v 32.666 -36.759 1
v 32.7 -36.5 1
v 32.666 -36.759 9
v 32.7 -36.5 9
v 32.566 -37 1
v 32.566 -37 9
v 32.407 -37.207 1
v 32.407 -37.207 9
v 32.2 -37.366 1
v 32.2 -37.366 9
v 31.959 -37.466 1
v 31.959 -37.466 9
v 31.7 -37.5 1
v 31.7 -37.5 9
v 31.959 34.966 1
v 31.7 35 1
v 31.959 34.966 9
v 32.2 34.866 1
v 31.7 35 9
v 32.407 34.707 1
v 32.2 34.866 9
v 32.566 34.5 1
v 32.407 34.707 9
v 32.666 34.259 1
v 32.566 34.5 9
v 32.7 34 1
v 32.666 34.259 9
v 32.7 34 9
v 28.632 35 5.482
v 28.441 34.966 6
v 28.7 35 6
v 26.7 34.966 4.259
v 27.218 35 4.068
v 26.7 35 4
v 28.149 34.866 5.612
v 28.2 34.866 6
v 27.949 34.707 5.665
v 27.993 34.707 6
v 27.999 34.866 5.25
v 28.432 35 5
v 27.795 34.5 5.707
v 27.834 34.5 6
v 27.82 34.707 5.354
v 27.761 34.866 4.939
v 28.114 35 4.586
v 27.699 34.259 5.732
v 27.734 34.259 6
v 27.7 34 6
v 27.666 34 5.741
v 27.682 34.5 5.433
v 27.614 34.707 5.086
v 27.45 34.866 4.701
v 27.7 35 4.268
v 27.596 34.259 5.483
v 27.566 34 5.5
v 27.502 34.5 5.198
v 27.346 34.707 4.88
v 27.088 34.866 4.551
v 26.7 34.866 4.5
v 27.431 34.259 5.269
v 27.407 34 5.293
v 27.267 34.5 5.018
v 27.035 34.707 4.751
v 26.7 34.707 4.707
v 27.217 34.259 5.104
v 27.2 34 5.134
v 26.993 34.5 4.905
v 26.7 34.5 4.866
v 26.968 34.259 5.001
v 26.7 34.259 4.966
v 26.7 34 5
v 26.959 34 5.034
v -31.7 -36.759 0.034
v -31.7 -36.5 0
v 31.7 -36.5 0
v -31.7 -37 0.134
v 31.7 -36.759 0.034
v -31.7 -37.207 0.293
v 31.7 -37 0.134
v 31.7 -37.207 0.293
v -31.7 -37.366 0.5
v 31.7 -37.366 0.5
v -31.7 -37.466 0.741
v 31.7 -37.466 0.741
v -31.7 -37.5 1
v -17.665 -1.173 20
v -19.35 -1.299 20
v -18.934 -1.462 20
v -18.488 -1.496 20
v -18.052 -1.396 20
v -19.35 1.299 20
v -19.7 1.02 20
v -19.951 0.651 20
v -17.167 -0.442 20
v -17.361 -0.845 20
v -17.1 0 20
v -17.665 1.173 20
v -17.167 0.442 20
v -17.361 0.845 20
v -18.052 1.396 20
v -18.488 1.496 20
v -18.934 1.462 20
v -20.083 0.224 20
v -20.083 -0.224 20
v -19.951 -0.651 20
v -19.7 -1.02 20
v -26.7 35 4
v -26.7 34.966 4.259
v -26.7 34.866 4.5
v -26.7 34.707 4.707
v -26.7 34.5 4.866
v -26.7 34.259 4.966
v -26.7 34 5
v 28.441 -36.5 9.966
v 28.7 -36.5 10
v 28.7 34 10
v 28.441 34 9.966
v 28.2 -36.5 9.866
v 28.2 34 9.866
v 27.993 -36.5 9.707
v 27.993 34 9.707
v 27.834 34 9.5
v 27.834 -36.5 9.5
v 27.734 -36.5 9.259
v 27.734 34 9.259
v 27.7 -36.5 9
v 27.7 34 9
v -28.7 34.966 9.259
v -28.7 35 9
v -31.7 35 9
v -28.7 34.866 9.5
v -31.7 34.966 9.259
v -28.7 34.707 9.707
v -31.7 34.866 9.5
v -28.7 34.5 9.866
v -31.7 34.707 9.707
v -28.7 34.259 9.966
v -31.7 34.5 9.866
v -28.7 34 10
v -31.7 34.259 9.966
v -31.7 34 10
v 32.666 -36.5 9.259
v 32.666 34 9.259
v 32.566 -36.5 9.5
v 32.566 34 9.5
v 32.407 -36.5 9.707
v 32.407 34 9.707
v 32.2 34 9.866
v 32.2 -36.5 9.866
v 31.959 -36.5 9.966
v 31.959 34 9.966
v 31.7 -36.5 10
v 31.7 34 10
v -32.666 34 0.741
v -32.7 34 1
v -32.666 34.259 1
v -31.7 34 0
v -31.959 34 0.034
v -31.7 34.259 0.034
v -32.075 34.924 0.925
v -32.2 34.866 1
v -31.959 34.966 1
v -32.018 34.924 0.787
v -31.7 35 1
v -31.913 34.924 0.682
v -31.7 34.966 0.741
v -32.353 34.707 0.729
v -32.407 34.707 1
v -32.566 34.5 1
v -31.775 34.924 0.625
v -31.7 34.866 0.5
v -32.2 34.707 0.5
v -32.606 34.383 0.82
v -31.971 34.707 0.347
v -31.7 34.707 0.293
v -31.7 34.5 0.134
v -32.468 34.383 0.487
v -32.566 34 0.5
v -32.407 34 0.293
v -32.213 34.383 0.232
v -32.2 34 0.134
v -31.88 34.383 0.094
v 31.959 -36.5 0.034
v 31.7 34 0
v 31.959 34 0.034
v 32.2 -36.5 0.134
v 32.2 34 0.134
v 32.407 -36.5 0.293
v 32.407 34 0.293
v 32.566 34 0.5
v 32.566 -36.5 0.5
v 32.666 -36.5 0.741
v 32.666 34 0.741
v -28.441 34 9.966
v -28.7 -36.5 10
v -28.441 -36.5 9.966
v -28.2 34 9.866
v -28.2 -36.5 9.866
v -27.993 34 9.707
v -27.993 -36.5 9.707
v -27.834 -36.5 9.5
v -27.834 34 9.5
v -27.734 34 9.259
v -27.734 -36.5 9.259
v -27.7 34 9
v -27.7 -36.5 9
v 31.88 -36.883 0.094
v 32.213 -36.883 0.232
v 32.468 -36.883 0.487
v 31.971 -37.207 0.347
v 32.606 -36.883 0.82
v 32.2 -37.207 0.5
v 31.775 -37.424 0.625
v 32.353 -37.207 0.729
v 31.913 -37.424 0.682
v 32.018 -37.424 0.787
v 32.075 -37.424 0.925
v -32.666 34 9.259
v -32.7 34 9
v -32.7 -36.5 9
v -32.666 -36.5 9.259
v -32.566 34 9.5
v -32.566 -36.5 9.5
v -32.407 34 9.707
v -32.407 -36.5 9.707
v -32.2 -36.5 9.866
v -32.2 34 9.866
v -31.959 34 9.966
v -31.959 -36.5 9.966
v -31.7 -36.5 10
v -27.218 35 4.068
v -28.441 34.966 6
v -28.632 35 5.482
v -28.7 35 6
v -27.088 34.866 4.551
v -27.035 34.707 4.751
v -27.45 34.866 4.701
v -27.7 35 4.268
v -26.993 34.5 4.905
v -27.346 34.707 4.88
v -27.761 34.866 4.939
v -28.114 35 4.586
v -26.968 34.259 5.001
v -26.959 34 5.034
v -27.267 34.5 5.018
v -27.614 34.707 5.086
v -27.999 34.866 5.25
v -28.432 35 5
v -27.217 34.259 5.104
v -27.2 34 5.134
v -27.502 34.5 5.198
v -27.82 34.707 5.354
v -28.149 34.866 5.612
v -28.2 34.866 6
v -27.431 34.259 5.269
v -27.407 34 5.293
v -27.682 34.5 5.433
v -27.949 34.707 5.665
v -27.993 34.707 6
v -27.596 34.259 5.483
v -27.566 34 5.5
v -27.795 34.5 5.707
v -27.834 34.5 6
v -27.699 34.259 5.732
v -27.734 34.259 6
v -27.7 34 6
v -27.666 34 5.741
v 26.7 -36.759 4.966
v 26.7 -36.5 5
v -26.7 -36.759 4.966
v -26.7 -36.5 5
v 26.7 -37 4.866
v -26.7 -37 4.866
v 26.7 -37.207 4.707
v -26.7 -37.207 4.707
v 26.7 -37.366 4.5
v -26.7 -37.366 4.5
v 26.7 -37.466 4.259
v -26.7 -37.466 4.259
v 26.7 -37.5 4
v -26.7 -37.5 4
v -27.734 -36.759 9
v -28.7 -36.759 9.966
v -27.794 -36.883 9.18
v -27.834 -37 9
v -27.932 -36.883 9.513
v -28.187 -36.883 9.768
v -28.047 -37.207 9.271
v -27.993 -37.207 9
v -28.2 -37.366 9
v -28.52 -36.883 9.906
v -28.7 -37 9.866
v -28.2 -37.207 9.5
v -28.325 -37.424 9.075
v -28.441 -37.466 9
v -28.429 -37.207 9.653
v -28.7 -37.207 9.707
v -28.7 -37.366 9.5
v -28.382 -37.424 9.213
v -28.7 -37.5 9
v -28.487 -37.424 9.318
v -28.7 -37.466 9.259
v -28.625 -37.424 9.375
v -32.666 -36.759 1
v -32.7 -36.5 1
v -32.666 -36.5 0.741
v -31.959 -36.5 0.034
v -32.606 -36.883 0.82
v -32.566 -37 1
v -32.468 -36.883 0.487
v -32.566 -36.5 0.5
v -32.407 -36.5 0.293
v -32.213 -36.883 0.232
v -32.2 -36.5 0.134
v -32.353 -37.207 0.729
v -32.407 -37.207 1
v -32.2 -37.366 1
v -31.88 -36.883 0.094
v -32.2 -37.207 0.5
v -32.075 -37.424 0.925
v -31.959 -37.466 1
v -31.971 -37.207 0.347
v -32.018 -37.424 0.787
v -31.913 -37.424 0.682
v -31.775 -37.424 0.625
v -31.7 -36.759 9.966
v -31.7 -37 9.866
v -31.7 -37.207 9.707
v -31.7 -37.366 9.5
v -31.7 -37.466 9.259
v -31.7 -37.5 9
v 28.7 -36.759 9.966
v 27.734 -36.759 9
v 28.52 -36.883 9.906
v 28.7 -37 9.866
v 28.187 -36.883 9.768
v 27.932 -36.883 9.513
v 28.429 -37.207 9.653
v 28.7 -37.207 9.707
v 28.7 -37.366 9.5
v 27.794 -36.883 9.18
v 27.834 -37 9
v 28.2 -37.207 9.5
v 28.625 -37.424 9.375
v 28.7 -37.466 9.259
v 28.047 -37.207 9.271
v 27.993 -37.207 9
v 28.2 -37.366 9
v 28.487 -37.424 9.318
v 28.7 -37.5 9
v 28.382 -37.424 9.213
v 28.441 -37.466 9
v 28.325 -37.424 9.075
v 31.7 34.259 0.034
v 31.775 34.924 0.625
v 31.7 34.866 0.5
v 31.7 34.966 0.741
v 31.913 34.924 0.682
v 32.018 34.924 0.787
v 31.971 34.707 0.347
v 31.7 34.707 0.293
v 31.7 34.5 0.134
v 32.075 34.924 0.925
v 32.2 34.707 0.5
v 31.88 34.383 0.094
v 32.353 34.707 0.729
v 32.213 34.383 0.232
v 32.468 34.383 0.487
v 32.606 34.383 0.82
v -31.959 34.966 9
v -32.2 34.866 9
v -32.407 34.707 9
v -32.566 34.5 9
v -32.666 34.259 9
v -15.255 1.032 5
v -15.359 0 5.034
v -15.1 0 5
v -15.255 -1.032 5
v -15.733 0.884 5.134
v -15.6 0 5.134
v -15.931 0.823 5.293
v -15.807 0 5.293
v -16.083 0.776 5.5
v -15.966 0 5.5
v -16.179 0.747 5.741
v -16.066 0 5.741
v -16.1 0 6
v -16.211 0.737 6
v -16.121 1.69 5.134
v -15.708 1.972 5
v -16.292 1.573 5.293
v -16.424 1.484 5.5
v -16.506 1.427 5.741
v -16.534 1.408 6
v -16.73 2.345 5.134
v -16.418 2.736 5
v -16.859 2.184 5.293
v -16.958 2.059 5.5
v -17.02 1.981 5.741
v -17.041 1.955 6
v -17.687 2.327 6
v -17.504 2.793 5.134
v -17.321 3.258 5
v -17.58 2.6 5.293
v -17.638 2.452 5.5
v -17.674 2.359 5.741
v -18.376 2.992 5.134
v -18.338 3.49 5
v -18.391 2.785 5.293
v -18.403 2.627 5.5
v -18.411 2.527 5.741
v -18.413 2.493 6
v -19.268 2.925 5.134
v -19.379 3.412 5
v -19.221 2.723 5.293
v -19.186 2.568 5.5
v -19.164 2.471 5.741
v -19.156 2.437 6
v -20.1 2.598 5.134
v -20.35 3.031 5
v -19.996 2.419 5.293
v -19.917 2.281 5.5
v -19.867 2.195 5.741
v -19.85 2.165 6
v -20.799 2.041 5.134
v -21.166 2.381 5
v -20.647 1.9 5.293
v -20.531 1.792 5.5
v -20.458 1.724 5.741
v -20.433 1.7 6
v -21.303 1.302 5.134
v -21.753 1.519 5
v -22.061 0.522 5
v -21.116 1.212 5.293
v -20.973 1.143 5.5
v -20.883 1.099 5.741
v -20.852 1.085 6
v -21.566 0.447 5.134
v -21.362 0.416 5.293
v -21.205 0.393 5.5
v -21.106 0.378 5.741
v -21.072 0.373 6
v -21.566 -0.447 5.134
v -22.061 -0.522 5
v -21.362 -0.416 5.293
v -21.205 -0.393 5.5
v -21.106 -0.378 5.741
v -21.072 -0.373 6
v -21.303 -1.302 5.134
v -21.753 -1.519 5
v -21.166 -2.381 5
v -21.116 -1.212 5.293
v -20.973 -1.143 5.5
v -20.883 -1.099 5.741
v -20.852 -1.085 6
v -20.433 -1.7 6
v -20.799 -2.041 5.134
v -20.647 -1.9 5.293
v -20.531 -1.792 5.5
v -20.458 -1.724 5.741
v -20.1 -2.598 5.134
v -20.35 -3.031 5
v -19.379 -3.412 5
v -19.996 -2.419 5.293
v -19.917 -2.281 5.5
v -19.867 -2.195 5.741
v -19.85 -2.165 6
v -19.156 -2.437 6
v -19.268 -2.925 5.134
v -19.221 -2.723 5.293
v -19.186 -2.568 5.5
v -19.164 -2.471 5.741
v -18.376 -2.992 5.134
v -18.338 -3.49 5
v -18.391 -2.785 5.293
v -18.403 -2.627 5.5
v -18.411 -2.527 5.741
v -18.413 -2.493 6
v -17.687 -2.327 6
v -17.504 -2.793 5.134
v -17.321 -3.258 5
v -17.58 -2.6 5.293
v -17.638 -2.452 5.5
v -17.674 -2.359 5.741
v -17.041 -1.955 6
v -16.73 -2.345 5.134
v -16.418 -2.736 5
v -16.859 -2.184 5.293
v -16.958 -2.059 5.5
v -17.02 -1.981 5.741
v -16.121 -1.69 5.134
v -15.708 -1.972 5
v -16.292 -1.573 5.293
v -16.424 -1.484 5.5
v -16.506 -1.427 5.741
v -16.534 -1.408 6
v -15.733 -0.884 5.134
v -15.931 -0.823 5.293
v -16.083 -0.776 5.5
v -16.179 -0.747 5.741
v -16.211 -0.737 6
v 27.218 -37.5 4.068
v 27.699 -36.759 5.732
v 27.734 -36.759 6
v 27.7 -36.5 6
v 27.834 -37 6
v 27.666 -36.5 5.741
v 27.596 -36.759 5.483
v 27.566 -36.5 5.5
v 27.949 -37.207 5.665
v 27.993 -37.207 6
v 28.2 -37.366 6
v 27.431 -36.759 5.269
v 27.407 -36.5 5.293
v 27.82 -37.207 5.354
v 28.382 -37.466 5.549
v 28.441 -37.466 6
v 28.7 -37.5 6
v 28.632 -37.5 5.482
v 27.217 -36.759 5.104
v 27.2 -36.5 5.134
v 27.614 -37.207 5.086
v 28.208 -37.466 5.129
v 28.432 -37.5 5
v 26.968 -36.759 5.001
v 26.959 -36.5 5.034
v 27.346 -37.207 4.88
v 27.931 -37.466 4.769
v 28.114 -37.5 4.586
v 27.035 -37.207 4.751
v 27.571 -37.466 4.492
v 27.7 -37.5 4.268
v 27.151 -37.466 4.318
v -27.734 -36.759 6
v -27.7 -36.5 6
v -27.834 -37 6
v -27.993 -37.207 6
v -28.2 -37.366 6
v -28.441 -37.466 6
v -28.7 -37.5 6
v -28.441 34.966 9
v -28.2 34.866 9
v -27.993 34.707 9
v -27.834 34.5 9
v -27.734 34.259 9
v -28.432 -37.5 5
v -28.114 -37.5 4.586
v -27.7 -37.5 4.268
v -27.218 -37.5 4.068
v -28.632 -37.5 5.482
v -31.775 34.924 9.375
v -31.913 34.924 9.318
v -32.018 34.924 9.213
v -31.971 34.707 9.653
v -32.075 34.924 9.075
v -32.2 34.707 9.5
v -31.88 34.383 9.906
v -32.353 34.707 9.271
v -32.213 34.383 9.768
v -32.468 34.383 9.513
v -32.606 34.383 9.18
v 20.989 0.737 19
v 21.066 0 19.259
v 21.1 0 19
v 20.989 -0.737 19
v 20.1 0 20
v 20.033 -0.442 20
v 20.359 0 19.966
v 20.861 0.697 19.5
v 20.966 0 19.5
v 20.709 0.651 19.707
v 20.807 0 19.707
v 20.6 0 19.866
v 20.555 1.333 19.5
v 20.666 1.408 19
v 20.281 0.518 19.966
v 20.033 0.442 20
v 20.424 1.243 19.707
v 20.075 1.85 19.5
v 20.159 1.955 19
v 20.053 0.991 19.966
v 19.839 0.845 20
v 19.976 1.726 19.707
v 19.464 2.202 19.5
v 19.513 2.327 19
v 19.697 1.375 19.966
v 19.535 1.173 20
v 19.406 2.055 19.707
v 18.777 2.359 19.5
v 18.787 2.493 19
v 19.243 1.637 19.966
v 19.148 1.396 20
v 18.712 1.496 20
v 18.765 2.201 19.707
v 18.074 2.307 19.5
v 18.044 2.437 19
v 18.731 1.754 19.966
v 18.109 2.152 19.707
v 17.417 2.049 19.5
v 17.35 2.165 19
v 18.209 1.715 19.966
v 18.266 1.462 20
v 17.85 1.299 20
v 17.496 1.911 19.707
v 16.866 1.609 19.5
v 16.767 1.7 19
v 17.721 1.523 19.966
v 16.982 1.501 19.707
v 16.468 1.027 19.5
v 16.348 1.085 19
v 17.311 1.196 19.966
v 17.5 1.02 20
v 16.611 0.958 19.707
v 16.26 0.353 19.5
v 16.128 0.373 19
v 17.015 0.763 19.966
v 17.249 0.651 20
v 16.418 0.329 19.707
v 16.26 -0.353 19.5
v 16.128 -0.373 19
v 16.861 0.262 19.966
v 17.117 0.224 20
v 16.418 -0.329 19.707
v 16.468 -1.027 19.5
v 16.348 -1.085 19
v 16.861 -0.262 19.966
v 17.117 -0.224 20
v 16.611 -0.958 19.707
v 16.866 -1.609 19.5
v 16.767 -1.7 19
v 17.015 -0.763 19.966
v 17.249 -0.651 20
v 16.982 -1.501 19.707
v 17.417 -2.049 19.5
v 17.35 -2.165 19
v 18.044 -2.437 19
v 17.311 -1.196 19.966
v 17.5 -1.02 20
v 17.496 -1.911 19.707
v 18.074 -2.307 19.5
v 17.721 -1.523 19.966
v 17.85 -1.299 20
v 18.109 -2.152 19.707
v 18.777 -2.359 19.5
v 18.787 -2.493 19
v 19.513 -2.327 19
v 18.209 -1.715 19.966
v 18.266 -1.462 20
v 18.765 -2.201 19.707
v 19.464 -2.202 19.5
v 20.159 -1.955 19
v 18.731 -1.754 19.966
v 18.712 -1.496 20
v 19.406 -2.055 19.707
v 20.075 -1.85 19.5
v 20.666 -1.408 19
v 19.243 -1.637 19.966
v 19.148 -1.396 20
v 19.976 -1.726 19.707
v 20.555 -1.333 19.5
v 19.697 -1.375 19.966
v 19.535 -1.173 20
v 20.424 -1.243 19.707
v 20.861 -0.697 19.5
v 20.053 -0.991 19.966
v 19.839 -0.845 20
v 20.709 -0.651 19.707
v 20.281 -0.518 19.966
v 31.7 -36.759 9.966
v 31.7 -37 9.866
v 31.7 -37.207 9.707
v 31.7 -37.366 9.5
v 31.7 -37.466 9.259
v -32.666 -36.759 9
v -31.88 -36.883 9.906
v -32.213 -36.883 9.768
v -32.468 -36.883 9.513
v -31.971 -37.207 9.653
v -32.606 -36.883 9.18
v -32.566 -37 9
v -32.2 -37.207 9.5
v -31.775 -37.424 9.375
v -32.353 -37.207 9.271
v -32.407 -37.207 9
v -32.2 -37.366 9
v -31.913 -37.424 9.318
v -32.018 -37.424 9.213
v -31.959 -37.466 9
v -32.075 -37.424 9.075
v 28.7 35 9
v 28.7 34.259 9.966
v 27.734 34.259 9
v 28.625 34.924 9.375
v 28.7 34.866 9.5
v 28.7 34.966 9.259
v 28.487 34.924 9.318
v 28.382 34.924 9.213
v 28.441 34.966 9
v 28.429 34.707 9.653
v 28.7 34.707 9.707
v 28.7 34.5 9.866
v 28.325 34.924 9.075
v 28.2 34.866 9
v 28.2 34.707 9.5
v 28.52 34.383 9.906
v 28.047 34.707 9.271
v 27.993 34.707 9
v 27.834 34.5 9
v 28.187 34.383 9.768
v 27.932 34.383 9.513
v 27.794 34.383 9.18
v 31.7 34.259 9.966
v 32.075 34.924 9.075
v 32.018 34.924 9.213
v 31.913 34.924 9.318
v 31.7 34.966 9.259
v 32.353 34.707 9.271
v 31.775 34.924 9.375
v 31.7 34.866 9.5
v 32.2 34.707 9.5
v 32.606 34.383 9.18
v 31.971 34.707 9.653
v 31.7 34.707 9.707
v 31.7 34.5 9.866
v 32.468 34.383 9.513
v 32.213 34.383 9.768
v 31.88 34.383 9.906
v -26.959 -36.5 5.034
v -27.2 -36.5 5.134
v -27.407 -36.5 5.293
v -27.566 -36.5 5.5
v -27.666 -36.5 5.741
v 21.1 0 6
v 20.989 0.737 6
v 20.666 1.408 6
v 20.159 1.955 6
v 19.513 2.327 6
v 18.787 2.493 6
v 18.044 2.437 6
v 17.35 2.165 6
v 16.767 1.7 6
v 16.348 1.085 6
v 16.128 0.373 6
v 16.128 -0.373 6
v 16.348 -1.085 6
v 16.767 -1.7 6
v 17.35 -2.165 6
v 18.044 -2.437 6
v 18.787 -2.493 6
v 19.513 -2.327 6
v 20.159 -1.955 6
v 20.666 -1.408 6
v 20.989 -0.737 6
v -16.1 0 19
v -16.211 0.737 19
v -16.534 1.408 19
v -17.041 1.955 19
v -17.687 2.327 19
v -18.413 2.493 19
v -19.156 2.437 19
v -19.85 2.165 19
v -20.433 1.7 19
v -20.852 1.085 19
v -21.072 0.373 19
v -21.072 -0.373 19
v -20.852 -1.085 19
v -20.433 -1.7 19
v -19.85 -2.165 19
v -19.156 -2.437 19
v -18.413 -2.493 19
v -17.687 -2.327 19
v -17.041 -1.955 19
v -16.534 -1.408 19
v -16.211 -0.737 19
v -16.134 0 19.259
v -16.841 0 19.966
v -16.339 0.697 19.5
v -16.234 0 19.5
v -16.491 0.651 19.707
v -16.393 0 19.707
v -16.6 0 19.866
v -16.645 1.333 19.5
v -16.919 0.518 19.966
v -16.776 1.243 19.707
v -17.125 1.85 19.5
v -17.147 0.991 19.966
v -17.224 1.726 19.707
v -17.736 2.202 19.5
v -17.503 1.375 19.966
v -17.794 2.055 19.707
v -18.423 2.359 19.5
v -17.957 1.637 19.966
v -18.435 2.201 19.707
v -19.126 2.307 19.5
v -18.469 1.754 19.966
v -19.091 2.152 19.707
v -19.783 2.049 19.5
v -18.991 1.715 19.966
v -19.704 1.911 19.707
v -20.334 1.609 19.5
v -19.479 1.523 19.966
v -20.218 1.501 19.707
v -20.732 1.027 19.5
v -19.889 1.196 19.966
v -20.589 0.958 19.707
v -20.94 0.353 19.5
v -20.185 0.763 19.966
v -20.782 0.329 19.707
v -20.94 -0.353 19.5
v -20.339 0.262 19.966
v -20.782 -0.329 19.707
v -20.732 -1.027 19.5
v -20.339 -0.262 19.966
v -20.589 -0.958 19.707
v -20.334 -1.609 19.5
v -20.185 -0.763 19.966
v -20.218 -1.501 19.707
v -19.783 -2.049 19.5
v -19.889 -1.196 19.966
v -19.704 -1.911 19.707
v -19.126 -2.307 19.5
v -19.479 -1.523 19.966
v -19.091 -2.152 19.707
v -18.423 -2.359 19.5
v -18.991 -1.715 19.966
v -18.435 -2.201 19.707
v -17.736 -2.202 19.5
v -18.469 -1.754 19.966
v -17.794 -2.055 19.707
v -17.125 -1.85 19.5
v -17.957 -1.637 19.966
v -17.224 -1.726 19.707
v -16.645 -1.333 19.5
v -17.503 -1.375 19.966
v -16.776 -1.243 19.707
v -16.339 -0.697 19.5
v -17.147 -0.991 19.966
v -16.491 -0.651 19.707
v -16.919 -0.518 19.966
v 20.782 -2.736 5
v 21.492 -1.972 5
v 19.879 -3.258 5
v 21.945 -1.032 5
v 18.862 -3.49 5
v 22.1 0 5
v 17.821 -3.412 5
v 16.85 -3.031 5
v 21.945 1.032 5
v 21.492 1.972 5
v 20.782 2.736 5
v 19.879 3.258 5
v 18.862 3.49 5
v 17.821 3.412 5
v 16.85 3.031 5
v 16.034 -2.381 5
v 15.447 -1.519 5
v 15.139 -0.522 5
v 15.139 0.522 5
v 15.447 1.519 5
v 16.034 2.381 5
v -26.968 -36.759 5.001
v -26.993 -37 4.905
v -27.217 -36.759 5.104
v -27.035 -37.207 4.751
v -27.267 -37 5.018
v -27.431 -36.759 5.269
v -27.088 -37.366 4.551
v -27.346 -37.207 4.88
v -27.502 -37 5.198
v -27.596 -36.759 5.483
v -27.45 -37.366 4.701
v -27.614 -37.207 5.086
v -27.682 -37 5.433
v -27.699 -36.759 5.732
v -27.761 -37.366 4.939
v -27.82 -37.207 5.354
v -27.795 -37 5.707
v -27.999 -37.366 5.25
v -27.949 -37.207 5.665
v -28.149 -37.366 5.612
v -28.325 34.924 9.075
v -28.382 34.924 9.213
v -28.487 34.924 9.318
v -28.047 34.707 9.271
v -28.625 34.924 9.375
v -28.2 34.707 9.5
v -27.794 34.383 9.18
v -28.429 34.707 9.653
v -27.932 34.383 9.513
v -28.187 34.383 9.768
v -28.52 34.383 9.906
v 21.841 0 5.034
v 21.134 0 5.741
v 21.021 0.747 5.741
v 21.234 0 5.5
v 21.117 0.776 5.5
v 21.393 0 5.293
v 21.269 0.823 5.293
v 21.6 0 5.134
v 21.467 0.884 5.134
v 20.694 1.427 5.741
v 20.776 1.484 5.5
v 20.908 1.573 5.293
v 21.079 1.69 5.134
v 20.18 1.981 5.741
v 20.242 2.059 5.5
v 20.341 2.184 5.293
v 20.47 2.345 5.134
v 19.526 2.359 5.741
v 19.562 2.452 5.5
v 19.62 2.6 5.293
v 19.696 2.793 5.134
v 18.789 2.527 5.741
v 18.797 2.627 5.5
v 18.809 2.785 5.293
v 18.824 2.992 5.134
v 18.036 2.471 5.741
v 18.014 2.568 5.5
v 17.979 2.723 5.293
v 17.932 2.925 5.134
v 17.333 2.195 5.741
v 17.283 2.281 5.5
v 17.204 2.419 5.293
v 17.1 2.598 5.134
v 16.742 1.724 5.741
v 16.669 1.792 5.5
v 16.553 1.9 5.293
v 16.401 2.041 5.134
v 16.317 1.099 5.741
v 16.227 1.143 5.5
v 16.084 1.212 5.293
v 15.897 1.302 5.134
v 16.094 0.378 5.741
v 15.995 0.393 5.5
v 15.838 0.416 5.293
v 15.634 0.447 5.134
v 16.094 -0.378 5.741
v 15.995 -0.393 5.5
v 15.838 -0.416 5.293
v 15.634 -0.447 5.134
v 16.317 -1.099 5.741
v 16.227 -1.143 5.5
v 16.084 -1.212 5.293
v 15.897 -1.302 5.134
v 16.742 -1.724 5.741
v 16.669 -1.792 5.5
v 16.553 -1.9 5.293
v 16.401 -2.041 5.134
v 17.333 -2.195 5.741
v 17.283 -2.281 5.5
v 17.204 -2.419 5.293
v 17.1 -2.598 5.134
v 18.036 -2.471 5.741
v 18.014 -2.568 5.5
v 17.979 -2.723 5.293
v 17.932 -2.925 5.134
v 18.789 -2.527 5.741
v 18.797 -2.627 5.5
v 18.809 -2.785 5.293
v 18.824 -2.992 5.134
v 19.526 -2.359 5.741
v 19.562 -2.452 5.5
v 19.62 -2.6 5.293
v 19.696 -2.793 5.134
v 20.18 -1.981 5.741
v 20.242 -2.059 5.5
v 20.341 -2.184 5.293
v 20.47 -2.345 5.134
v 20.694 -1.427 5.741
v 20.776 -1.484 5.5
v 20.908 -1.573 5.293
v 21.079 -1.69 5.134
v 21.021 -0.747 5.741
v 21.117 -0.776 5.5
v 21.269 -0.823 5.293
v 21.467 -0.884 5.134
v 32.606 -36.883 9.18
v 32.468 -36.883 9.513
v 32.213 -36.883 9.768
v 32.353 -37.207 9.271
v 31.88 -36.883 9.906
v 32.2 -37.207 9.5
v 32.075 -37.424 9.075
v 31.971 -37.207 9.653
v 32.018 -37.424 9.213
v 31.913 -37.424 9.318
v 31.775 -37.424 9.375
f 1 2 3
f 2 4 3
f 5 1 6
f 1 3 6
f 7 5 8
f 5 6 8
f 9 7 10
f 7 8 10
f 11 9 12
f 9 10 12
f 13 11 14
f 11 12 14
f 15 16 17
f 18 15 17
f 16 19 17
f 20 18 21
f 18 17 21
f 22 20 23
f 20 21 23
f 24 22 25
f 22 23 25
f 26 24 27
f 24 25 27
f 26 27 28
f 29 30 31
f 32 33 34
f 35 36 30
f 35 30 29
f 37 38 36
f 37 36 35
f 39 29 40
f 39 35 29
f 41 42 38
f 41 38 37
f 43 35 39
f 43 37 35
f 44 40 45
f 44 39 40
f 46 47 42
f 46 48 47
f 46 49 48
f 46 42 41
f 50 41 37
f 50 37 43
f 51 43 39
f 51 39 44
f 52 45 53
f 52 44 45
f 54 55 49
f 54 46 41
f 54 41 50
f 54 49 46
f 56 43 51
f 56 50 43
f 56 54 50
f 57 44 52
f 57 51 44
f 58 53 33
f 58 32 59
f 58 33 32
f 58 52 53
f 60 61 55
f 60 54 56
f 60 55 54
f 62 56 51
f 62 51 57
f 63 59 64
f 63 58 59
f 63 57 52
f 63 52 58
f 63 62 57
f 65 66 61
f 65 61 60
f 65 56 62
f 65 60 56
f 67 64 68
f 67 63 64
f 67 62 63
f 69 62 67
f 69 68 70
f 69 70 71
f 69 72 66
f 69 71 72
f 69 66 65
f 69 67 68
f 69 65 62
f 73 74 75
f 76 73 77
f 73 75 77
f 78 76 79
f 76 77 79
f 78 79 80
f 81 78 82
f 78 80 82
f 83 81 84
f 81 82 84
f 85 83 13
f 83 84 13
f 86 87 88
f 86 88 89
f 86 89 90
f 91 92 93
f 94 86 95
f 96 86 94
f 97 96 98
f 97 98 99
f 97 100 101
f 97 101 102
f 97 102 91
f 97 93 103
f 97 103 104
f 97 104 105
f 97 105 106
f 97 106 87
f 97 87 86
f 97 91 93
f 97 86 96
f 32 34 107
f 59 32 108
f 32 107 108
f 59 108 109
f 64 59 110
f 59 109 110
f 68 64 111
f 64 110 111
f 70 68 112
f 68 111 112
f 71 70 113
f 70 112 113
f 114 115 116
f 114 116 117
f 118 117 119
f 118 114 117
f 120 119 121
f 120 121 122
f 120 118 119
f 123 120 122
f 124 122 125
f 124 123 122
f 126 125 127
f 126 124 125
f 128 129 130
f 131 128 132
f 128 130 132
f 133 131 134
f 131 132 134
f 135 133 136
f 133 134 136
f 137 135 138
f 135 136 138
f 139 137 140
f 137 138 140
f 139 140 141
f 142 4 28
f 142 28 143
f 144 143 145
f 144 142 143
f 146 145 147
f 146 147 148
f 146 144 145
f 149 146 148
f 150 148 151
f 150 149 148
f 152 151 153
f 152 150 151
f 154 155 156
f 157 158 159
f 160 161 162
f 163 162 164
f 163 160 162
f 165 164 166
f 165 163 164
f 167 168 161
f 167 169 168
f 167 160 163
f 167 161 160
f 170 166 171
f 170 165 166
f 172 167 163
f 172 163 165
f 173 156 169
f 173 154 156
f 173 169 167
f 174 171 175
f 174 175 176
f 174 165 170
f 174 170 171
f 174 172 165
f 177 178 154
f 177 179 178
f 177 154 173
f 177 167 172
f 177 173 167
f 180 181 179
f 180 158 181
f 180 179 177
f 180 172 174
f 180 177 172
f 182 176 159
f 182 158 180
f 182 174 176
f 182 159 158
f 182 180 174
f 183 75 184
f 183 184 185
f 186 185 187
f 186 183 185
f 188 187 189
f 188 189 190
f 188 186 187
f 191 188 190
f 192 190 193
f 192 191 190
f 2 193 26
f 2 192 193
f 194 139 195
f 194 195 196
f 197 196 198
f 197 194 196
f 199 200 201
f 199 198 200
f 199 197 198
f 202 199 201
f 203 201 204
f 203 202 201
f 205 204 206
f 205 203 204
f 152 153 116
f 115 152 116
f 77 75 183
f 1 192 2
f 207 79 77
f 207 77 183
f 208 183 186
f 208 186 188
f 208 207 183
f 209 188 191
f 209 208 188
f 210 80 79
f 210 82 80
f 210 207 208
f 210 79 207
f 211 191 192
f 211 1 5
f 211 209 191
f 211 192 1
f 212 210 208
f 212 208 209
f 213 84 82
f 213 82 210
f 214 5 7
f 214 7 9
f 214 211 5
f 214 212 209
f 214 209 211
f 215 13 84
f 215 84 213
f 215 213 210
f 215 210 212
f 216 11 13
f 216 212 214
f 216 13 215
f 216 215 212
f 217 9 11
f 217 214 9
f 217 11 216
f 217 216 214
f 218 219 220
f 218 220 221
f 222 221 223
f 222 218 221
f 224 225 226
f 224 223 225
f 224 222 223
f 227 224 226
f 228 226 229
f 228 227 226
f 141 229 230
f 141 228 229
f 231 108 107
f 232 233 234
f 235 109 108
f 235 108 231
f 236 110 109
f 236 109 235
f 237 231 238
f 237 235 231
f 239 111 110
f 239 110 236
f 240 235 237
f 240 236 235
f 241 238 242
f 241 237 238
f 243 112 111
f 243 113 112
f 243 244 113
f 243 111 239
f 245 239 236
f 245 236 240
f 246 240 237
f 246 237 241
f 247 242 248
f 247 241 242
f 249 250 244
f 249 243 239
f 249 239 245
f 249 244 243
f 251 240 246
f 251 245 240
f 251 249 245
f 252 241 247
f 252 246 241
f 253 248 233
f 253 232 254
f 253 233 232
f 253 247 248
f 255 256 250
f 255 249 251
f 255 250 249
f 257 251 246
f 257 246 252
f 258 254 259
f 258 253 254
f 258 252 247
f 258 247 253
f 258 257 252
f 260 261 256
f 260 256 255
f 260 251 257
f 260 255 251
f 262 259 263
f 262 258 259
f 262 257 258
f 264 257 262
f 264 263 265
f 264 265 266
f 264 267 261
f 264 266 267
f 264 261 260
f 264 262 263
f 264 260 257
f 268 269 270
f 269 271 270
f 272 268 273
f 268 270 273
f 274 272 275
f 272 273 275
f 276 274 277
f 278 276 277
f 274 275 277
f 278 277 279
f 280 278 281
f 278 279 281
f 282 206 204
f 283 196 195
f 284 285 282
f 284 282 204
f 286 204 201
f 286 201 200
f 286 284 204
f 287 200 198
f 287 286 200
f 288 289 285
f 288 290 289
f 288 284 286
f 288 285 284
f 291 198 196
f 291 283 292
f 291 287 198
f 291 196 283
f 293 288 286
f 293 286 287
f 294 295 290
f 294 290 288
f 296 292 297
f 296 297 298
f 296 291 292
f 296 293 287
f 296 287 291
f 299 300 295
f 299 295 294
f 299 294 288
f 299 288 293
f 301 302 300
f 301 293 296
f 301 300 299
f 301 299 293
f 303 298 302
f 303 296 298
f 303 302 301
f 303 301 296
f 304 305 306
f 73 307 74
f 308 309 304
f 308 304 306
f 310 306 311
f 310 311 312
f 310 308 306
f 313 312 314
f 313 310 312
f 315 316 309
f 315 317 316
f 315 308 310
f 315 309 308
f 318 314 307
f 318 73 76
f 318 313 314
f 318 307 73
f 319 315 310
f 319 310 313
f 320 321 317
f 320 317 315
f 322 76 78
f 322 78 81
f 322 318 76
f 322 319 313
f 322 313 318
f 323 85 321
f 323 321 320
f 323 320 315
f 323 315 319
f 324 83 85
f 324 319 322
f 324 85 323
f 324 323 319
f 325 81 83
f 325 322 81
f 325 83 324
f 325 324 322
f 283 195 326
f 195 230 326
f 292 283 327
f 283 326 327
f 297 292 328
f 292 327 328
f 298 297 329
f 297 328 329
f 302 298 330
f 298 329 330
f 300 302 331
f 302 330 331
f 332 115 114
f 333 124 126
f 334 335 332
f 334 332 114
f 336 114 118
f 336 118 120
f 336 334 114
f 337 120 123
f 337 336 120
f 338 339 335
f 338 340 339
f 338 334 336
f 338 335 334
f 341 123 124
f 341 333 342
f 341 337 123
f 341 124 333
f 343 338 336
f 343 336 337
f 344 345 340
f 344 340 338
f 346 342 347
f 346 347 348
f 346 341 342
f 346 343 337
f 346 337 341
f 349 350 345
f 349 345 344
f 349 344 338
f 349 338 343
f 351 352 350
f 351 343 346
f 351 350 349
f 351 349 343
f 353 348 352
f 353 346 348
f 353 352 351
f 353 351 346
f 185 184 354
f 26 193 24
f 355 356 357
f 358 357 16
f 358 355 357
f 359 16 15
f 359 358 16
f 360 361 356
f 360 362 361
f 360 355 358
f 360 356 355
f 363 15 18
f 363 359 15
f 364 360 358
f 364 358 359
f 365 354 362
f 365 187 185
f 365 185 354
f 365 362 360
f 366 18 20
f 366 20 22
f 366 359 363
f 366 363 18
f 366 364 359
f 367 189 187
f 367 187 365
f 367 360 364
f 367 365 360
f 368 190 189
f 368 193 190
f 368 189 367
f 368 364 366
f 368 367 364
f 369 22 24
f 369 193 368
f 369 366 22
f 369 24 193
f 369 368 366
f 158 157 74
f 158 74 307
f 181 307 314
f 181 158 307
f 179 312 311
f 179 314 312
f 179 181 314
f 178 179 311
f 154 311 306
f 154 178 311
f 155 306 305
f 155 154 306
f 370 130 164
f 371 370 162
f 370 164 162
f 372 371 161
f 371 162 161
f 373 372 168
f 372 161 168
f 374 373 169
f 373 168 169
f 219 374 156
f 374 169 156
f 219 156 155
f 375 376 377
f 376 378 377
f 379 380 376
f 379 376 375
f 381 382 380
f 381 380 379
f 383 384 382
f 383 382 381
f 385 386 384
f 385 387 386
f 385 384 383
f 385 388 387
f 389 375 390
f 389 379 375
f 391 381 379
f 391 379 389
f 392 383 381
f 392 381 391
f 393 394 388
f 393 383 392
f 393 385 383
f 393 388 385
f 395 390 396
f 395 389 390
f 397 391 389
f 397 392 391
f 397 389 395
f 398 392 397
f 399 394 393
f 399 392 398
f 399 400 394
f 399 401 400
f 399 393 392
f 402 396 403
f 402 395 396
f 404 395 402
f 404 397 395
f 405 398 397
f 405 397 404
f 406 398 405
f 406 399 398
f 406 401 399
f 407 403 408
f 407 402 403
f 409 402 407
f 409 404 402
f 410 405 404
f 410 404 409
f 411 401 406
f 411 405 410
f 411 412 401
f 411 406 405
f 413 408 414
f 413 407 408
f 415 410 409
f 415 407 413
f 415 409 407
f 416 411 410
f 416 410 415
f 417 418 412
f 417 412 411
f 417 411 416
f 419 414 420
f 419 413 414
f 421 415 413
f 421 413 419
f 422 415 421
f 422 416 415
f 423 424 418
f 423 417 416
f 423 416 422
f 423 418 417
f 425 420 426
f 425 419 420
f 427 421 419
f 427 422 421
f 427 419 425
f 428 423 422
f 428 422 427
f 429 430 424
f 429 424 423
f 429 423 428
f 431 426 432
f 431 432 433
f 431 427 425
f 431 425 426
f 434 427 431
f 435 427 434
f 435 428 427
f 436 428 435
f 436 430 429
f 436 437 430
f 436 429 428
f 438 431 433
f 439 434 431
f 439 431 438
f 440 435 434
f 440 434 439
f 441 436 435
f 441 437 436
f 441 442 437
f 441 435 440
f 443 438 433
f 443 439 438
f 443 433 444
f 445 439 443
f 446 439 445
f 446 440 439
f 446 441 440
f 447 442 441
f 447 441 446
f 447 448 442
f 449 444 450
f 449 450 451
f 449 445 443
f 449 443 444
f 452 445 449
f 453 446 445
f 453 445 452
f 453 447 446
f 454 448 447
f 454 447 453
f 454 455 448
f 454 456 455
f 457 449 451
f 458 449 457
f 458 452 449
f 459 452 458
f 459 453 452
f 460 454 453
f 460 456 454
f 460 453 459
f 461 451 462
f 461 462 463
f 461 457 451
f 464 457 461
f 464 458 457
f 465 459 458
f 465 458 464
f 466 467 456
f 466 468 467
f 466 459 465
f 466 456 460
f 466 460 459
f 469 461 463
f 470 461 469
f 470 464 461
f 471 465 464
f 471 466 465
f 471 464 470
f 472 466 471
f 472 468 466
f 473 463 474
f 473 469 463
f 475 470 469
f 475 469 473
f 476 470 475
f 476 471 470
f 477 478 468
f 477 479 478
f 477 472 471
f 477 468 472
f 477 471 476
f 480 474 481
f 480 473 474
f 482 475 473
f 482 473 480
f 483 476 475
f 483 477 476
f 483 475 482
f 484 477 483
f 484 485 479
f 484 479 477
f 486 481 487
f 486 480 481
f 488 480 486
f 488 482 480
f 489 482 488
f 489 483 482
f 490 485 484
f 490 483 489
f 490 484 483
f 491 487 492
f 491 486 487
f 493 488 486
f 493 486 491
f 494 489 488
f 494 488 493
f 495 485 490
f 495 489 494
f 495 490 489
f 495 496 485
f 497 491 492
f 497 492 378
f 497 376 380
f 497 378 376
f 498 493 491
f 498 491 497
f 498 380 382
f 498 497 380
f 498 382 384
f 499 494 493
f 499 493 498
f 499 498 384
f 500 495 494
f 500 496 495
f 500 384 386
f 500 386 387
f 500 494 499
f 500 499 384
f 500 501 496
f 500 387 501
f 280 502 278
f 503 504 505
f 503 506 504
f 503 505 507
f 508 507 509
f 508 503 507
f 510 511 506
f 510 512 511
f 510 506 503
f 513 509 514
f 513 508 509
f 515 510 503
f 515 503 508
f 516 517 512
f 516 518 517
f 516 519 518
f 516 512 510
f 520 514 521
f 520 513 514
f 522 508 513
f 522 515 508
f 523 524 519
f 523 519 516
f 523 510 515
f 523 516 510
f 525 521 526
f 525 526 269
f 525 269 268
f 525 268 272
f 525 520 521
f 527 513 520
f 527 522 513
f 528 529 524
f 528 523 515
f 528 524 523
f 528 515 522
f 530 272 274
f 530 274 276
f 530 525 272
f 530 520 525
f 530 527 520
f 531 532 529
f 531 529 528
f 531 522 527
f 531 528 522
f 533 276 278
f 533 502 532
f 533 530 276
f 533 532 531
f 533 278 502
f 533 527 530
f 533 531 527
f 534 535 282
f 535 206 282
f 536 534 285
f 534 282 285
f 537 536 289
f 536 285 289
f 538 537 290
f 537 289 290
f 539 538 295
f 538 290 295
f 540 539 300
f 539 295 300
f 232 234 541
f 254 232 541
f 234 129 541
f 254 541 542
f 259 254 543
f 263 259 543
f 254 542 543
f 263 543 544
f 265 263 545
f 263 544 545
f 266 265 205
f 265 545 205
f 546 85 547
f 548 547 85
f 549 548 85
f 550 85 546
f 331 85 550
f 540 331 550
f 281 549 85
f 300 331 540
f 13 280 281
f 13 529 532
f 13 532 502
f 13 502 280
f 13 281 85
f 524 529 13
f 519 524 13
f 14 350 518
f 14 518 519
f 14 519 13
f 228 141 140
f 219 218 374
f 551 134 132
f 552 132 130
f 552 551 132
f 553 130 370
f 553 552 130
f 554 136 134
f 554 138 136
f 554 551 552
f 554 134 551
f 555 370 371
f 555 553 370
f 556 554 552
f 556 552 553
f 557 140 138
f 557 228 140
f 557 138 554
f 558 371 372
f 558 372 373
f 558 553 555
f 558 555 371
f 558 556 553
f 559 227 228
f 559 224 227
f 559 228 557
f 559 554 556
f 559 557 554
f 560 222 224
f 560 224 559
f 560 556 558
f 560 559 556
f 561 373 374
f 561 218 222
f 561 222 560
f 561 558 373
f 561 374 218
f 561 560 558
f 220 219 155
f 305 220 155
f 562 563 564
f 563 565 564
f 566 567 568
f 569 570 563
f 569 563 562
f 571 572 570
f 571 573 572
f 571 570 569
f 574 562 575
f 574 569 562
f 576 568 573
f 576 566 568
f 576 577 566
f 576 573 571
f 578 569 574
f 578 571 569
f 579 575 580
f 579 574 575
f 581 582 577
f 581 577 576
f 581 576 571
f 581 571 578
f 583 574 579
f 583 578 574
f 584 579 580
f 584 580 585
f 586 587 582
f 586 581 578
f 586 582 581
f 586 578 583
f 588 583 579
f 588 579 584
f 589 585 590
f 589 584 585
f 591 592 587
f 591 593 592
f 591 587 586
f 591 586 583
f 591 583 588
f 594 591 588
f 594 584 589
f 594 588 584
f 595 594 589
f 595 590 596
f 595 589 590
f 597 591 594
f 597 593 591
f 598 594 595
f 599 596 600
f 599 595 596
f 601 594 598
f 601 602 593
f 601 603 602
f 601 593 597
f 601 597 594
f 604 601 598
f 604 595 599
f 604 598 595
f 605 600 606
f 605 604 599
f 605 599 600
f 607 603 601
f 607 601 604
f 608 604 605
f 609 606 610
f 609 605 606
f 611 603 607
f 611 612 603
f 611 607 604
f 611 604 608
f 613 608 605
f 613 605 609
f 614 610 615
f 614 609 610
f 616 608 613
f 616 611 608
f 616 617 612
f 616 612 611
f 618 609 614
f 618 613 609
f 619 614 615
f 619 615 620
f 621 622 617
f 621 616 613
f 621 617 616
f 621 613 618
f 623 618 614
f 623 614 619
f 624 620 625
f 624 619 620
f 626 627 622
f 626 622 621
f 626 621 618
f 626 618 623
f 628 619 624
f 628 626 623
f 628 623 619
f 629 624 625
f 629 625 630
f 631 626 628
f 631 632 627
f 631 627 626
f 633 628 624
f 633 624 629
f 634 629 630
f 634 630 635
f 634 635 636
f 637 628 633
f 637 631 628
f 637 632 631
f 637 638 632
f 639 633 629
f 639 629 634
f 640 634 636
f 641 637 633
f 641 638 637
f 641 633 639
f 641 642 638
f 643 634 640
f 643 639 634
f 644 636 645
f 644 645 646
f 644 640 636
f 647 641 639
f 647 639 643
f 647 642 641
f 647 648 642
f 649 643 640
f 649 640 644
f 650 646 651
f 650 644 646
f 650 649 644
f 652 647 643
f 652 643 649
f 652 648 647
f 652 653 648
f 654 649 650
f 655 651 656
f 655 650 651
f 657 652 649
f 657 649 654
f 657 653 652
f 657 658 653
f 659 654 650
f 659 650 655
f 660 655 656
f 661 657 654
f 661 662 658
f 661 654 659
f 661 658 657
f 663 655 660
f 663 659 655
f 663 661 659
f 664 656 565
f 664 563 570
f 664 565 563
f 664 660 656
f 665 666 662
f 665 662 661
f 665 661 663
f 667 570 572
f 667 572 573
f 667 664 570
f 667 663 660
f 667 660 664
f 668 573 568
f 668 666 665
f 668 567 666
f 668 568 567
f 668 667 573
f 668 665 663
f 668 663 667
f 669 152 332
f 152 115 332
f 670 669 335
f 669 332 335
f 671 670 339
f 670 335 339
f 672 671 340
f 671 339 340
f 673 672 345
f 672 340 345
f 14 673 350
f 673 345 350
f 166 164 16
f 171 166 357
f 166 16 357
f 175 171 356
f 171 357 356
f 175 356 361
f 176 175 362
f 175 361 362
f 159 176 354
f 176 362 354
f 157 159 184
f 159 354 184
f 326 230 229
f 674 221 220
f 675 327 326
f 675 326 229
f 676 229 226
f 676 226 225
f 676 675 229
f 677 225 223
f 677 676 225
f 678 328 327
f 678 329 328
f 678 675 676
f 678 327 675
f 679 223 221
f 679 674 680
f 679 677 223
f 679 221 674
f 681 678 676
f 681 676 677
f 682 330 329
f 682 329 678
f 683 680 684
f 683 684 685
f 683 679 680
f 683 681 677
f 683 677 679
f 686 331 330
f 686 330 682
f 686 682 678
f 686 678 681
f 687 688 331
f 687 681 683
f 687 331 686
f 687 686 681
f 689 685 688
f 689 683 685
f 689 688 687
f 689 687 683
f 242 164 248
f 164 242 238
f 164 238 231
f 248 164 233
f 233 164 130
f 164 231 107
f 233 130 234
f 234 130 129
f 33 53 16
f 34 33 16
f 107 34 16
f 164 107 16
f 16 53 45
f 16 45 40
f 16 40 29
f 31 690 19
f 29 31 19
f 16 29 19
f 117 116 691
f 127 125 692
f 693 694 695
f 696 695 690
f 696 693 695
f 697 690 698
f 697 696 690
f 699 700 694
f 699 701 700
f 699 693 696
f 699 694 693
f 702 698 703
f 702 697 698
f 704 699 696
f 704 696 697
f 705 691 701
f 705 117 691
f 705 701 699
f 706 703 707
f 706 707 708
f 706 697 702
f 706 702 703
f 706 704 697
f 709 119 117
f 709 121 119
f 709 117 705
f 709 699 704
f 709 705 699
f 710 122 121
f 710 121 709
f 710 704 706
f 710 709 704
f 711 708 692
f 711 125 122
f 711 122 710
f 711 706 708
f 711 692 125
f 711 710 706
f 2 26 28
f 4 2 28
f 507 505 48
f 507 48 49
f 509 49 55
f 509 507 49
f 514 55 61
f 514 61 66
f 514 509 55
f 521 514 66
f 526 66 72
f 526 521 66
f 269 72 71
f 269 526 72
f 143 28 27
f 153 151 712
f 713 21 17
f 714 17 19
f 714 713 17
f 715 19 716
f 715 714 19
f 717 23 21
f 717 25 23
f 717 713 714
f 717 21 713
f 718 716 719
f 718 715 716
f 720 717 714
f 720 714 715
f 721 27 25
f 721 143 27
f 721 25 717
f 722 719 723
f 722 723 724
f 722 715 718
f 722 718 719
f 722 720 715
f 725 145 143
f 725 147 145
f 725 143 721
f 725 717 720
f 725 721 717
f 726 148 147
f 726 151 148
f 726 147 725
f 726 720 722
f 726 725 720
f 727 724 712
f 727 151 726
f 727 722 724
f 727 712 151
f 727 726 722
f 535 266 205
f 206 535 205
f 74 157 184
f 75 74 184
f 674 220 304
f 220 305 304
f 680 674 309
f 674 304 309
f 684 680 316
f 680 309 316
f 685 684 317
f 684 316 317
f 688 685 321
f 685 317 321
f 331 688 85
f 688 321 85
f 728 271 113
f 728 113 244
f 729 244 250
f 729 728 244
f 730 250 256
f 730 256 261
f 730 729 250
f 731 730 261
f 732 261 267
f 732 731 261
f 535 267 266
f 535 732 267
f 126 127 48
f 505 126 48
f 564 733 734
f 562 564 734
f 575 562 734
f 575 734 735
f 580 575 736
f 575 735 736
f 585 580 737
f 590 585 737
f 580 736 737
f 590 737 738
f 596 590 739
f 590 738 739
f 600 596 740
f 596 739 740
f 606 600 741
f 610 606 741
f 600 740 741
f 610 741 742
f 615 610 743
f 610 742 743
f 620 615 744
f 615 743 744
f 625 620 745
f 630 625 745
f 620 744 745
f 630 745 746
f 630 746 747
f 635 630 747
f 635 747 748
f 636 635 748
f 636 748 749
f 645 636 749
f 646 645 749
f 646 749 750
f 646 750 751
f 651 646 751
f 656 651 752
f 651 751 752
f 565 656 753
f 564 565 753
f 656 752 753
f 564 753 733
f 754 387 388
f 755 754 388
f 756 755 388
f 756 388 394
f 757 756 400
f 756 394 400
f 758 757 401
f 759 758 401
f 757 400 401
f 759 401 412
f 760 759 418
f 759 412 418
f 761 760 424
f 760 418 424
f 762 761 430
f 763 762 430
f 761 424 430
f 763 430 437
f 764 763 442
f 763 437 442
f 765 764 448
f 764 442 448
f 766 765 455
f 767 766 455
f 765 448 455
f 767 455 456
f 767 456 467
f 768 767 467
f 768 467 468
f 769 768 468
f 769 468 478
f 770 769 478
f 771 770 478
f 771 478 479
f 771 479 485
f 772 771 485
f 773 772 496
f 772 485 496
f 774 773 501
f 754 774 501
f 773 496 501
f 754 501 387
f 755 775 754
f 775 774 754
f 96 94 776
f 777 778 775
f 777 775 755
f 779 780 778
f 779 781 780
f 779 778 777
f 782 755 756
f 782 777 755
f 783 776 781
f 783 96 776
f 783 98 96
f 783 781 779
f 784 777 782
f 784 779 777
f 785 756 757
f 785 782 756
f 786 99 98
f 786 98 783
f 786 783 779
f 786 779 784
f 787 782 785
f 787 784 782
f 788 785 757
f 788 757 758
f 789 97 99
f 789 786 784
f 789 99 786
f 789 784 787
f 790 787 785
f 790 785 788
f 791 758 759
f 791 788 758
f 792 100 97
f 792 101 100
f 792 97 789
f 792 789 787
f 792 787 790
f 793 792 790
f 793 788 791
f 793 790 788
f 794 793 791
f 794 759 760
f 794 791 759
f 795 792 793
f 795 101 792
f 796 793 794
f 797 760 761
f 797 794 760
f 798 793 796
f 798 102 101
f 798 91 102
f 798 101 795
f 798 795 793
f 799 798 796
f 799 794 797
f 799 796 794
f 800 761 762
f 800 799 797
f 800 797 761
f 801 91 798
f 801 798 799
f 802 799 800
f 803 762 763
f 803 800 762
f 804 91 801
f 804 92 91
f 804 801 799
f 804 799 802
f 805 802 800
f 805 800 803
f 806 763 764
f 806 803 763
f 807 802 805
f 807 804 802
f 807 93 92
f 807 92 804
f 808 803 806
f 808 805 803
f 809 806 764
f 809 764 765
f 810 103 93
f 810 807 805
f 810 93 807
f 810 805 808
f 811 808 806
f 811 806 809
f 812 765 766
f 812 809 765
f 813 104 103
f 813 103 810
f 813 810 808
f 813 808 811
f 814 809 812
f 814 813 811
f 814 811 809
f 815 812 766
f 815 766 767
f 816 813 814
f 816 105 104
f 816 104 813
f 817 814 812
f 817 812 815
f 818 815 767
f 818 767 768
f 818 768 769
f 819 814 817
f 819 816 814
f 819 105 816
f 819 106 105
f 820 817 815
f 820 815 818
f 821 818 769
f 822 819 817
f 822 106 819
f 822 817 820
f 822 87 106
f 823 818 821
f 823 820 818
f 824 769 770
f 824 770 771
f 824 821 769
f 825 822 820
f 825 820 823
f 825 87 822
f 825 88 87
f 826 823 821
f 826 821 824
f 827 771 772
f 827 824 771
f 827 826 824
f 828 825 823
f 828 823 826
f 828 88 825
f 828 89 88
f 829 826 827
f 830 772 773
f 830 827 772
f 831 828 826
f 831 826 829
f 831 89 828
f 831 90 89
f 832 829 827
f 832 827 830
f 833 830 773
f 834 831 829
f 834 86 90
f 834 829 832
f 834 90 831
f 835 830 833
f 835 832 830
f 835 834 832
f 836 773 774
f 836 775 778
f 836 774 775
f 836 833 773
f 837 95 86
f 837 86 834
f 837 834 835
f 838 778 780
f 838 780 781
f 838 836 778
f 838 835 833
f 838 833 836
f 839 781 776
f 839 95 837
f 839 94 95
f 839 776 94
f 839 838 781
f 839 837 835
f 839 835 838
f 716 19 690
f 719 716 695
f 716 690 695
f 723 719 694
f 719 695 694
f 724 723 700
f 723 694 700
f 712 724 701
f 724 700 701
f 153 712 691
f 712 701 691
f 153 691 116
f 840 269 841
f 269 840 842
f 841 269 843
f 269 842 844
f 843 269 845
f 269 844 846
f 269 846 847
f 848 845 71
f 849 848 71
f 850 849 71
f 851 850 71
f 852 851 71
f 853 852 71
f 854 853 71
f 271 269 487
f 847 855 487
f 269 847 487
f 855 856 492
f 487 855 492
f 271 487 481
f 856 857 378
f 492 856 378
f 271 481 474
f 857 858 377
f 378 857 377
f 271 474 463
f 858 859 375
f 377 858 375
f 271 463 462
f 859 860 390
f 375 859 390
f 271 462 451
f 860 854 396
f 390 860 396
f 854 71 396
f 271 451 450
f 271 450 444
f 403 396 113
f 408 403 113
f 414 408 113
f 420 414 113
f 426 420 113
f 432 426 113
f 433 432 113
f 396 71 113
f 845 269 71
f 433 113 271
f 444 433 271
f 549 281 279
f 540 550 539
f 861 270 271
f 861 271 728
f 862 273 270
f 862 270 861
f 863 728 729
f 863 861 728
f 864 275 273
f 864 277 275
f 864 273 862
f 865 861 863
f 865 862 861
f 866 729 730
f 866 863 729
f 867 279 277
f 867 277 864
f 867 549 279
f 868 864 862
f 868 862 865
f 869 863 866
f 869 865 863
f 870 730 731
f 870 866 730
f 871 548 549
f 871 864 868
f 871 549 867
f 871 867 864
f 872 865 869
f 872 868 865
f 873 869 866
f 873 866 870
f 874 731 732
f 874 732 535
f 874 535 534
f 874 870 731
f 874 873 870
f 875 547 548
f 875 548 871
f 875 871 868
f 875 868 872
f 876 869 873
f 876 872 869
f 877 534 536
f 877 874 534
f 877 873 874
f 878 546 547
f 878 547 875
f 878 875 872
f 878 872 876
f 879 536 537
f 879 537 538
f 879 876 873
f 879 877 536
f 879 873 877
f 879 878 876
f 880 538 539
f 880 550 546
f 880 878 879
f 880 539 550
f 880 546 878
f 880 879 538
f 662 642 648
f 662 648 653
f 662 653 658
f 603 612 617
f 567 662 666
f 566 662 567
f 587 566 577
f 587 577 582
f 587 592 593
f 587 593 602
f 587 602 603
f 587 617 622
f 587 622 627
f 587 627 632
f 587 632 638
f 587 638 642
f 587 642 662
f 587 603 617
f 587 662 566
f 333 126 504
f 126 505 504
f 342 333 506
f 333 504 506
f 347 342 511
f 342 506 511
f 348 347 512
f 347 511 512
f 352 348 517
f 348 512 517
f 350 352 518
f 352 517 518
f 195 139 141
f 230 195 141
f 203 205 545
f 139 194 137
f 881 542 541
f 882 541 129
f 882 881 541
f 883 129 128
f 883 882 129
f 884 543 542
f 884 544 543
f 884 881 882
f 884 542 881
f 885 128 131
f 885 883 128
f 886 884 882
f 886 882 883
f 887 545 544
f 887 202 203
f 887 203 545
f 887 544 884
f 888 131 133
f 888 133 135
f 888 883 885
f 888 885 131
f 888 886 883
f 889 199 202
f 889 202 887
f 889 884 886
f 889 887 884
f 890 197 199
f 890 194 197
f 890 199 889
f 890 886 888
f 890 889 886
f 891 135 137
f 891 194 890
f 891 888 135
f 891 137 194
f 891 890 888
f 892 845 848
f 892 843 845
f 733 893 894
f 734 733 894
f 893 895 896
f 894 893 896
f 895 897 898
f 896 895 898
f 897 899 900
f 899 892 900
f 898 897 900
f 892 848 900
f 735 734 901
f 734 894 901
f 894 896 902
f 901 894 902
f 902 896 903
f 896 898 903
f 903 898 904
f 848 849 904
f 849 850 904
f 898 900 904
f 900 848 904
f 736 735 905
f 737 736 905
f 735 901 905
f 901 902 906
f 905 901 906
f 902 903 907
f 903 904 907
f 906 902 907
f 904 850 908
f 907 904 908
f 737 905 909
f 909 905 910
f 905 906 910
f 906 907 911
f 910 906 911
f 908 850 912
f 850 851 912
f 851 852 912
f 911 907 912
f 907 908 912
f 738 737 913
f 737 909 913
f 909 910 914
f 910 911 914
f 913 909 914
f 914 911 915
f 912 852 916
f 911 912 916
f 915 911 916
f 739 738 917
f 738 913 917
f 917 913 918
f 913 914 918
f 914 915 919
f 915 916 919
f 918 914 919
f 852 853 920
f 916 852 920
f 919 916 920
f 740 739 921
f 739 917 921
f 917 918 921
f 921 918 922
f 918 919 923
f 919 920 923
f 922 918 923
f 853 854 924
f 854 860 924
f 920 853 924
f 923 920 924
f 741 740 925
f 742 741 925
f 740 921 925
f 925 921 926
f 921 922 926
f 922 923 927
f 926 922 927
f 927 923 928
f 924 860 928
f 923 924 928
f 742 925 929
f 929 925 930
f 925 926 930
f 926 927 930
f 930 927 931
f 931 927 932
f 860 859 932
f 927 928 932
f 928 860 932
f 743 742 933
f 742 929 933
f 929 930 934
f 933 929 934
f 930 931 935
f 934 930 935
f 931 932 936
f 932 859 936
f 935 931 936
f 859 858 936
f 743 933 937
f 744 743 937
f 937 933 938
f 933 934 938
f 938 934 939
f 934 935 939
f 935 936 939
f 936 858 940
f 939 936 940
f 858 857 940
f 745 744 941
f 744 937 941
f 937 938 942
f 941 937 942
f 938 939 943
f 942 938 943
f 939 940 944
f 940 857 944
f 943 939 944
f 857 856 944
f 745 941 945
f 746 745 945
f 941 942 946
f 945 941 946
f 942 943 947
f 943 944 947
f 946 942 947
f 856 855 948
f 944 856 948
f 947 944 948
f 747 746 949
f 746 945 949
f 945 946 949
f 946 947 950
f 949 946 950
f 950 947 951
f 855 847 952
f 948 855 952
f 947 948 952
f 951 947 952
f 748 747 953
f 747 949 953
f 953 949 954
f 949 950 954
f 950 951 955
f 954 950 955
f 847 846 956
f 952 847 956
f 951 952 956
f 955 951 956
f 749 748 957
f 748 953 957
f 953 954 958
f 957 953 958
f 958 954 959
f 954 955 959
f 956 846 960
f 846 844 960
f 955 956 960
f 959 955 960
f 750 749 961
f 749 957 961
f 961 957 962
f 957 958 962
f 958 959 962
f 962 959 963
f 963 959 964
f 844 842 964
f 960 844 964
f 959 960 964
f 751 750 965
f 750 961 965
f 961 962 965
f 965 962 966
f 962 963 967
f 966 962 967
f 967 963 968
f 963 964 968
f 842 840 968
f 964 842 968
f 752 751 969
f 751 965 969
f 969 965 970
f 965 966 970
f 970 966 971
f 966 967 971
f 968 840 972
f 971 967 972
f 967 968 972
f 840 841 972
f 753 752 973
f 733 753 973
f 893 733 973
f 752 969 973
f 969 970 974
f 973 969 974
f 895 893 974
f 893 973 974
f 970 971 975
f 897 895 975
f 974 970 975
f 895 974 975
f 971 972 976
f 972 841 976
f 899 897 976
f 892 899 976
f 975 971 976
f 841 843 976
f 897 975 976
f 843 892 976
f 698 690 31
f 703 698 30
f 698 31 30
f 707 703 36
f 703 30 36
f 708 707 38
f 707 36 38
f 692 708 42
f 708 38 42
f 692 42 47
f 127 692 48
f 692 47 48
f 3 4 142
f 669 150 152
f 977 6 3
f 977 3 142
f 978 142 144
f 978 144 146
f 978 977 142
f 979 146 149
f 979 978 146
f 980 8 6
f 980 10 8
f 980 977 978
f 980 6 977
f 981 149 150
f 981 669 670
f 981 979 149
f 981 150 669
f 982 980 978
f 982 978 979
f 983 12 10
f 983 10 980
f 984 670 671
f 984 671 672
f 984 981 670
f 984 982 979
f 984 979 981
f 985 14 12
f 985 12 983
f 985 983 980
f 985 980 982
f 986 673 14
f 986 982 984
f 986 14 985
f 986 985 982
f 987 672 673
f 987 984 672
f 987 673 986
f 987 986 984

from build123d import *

# Parameters (mm, degrees)
F1_DEPTH      = 35
F1_DEPTH_BACK = 37.5
F2_R          = 2.5
F3_DEPTH      = 15
F4_R          = 1
F5_R          = 1
F6_R          = 1


with BuildPart() as f1:
    # F0 (on Front) → F1 (new body, two sides)
    with BuildSketch(Plane.XZ) as f1_sk:
        Polygon((-32.7, 0), (0, 0), (32.7, 0), (32.7, 10), (27.7, 10), (27.7, 5), (0, 5), (-27.7, 5), (-27.7, 10), (-32.7, 10), align=None)
    extrude(amount=-F1_DEPTH)
    extrude(f1_sk.sketch, amount=F1_DEPTH_BACK)

    # F2 (on face) → F3 (join)
    with BuildSketch(Plane.XY.offset(5)):
        with Locations((-18.6, 0)):
            Circle(F2_R)
        with Locations((18.6, 0)):
            Circle(F2_R)
    extrude(amount=F3_DEPTH)

    # F4
    f4_edges = [f1.edges().sort_by_distance(p)[0] for p in [
        (-27.7, -1.25, 5),
        (27.7, -1.25, 5),
        (-27.7, -1.25, 10),
        (-32.7, -1.25, 10),
        (27.7, -1.25, 10),
        (32.7, -1.25, 10),
        (32.7, -1.25, 0),
        (-32.7, -1.25, 0),
    ]]
    fillet(f4_edges, radius=F4_R)

    # F5
    f5_edges = [f1.edges().sort_by_distance(p)[0] for p in [
        (-21.1, 0, 20),
        (16.1, 0, 20),
    ]]
    fillet(f5_edges, radius=F5_R)

    # F6
    f6_edges = [f1.edges().sort_by_distance(p)[0] for p in [
        (0, -37.5, 5),
        (0, 35, 0),
        (-21.1, 0, 5),
        (16.1, 0, 5),
    ]]
    fillet(f6_edges, radius=F6_R)


solid = f1.part
